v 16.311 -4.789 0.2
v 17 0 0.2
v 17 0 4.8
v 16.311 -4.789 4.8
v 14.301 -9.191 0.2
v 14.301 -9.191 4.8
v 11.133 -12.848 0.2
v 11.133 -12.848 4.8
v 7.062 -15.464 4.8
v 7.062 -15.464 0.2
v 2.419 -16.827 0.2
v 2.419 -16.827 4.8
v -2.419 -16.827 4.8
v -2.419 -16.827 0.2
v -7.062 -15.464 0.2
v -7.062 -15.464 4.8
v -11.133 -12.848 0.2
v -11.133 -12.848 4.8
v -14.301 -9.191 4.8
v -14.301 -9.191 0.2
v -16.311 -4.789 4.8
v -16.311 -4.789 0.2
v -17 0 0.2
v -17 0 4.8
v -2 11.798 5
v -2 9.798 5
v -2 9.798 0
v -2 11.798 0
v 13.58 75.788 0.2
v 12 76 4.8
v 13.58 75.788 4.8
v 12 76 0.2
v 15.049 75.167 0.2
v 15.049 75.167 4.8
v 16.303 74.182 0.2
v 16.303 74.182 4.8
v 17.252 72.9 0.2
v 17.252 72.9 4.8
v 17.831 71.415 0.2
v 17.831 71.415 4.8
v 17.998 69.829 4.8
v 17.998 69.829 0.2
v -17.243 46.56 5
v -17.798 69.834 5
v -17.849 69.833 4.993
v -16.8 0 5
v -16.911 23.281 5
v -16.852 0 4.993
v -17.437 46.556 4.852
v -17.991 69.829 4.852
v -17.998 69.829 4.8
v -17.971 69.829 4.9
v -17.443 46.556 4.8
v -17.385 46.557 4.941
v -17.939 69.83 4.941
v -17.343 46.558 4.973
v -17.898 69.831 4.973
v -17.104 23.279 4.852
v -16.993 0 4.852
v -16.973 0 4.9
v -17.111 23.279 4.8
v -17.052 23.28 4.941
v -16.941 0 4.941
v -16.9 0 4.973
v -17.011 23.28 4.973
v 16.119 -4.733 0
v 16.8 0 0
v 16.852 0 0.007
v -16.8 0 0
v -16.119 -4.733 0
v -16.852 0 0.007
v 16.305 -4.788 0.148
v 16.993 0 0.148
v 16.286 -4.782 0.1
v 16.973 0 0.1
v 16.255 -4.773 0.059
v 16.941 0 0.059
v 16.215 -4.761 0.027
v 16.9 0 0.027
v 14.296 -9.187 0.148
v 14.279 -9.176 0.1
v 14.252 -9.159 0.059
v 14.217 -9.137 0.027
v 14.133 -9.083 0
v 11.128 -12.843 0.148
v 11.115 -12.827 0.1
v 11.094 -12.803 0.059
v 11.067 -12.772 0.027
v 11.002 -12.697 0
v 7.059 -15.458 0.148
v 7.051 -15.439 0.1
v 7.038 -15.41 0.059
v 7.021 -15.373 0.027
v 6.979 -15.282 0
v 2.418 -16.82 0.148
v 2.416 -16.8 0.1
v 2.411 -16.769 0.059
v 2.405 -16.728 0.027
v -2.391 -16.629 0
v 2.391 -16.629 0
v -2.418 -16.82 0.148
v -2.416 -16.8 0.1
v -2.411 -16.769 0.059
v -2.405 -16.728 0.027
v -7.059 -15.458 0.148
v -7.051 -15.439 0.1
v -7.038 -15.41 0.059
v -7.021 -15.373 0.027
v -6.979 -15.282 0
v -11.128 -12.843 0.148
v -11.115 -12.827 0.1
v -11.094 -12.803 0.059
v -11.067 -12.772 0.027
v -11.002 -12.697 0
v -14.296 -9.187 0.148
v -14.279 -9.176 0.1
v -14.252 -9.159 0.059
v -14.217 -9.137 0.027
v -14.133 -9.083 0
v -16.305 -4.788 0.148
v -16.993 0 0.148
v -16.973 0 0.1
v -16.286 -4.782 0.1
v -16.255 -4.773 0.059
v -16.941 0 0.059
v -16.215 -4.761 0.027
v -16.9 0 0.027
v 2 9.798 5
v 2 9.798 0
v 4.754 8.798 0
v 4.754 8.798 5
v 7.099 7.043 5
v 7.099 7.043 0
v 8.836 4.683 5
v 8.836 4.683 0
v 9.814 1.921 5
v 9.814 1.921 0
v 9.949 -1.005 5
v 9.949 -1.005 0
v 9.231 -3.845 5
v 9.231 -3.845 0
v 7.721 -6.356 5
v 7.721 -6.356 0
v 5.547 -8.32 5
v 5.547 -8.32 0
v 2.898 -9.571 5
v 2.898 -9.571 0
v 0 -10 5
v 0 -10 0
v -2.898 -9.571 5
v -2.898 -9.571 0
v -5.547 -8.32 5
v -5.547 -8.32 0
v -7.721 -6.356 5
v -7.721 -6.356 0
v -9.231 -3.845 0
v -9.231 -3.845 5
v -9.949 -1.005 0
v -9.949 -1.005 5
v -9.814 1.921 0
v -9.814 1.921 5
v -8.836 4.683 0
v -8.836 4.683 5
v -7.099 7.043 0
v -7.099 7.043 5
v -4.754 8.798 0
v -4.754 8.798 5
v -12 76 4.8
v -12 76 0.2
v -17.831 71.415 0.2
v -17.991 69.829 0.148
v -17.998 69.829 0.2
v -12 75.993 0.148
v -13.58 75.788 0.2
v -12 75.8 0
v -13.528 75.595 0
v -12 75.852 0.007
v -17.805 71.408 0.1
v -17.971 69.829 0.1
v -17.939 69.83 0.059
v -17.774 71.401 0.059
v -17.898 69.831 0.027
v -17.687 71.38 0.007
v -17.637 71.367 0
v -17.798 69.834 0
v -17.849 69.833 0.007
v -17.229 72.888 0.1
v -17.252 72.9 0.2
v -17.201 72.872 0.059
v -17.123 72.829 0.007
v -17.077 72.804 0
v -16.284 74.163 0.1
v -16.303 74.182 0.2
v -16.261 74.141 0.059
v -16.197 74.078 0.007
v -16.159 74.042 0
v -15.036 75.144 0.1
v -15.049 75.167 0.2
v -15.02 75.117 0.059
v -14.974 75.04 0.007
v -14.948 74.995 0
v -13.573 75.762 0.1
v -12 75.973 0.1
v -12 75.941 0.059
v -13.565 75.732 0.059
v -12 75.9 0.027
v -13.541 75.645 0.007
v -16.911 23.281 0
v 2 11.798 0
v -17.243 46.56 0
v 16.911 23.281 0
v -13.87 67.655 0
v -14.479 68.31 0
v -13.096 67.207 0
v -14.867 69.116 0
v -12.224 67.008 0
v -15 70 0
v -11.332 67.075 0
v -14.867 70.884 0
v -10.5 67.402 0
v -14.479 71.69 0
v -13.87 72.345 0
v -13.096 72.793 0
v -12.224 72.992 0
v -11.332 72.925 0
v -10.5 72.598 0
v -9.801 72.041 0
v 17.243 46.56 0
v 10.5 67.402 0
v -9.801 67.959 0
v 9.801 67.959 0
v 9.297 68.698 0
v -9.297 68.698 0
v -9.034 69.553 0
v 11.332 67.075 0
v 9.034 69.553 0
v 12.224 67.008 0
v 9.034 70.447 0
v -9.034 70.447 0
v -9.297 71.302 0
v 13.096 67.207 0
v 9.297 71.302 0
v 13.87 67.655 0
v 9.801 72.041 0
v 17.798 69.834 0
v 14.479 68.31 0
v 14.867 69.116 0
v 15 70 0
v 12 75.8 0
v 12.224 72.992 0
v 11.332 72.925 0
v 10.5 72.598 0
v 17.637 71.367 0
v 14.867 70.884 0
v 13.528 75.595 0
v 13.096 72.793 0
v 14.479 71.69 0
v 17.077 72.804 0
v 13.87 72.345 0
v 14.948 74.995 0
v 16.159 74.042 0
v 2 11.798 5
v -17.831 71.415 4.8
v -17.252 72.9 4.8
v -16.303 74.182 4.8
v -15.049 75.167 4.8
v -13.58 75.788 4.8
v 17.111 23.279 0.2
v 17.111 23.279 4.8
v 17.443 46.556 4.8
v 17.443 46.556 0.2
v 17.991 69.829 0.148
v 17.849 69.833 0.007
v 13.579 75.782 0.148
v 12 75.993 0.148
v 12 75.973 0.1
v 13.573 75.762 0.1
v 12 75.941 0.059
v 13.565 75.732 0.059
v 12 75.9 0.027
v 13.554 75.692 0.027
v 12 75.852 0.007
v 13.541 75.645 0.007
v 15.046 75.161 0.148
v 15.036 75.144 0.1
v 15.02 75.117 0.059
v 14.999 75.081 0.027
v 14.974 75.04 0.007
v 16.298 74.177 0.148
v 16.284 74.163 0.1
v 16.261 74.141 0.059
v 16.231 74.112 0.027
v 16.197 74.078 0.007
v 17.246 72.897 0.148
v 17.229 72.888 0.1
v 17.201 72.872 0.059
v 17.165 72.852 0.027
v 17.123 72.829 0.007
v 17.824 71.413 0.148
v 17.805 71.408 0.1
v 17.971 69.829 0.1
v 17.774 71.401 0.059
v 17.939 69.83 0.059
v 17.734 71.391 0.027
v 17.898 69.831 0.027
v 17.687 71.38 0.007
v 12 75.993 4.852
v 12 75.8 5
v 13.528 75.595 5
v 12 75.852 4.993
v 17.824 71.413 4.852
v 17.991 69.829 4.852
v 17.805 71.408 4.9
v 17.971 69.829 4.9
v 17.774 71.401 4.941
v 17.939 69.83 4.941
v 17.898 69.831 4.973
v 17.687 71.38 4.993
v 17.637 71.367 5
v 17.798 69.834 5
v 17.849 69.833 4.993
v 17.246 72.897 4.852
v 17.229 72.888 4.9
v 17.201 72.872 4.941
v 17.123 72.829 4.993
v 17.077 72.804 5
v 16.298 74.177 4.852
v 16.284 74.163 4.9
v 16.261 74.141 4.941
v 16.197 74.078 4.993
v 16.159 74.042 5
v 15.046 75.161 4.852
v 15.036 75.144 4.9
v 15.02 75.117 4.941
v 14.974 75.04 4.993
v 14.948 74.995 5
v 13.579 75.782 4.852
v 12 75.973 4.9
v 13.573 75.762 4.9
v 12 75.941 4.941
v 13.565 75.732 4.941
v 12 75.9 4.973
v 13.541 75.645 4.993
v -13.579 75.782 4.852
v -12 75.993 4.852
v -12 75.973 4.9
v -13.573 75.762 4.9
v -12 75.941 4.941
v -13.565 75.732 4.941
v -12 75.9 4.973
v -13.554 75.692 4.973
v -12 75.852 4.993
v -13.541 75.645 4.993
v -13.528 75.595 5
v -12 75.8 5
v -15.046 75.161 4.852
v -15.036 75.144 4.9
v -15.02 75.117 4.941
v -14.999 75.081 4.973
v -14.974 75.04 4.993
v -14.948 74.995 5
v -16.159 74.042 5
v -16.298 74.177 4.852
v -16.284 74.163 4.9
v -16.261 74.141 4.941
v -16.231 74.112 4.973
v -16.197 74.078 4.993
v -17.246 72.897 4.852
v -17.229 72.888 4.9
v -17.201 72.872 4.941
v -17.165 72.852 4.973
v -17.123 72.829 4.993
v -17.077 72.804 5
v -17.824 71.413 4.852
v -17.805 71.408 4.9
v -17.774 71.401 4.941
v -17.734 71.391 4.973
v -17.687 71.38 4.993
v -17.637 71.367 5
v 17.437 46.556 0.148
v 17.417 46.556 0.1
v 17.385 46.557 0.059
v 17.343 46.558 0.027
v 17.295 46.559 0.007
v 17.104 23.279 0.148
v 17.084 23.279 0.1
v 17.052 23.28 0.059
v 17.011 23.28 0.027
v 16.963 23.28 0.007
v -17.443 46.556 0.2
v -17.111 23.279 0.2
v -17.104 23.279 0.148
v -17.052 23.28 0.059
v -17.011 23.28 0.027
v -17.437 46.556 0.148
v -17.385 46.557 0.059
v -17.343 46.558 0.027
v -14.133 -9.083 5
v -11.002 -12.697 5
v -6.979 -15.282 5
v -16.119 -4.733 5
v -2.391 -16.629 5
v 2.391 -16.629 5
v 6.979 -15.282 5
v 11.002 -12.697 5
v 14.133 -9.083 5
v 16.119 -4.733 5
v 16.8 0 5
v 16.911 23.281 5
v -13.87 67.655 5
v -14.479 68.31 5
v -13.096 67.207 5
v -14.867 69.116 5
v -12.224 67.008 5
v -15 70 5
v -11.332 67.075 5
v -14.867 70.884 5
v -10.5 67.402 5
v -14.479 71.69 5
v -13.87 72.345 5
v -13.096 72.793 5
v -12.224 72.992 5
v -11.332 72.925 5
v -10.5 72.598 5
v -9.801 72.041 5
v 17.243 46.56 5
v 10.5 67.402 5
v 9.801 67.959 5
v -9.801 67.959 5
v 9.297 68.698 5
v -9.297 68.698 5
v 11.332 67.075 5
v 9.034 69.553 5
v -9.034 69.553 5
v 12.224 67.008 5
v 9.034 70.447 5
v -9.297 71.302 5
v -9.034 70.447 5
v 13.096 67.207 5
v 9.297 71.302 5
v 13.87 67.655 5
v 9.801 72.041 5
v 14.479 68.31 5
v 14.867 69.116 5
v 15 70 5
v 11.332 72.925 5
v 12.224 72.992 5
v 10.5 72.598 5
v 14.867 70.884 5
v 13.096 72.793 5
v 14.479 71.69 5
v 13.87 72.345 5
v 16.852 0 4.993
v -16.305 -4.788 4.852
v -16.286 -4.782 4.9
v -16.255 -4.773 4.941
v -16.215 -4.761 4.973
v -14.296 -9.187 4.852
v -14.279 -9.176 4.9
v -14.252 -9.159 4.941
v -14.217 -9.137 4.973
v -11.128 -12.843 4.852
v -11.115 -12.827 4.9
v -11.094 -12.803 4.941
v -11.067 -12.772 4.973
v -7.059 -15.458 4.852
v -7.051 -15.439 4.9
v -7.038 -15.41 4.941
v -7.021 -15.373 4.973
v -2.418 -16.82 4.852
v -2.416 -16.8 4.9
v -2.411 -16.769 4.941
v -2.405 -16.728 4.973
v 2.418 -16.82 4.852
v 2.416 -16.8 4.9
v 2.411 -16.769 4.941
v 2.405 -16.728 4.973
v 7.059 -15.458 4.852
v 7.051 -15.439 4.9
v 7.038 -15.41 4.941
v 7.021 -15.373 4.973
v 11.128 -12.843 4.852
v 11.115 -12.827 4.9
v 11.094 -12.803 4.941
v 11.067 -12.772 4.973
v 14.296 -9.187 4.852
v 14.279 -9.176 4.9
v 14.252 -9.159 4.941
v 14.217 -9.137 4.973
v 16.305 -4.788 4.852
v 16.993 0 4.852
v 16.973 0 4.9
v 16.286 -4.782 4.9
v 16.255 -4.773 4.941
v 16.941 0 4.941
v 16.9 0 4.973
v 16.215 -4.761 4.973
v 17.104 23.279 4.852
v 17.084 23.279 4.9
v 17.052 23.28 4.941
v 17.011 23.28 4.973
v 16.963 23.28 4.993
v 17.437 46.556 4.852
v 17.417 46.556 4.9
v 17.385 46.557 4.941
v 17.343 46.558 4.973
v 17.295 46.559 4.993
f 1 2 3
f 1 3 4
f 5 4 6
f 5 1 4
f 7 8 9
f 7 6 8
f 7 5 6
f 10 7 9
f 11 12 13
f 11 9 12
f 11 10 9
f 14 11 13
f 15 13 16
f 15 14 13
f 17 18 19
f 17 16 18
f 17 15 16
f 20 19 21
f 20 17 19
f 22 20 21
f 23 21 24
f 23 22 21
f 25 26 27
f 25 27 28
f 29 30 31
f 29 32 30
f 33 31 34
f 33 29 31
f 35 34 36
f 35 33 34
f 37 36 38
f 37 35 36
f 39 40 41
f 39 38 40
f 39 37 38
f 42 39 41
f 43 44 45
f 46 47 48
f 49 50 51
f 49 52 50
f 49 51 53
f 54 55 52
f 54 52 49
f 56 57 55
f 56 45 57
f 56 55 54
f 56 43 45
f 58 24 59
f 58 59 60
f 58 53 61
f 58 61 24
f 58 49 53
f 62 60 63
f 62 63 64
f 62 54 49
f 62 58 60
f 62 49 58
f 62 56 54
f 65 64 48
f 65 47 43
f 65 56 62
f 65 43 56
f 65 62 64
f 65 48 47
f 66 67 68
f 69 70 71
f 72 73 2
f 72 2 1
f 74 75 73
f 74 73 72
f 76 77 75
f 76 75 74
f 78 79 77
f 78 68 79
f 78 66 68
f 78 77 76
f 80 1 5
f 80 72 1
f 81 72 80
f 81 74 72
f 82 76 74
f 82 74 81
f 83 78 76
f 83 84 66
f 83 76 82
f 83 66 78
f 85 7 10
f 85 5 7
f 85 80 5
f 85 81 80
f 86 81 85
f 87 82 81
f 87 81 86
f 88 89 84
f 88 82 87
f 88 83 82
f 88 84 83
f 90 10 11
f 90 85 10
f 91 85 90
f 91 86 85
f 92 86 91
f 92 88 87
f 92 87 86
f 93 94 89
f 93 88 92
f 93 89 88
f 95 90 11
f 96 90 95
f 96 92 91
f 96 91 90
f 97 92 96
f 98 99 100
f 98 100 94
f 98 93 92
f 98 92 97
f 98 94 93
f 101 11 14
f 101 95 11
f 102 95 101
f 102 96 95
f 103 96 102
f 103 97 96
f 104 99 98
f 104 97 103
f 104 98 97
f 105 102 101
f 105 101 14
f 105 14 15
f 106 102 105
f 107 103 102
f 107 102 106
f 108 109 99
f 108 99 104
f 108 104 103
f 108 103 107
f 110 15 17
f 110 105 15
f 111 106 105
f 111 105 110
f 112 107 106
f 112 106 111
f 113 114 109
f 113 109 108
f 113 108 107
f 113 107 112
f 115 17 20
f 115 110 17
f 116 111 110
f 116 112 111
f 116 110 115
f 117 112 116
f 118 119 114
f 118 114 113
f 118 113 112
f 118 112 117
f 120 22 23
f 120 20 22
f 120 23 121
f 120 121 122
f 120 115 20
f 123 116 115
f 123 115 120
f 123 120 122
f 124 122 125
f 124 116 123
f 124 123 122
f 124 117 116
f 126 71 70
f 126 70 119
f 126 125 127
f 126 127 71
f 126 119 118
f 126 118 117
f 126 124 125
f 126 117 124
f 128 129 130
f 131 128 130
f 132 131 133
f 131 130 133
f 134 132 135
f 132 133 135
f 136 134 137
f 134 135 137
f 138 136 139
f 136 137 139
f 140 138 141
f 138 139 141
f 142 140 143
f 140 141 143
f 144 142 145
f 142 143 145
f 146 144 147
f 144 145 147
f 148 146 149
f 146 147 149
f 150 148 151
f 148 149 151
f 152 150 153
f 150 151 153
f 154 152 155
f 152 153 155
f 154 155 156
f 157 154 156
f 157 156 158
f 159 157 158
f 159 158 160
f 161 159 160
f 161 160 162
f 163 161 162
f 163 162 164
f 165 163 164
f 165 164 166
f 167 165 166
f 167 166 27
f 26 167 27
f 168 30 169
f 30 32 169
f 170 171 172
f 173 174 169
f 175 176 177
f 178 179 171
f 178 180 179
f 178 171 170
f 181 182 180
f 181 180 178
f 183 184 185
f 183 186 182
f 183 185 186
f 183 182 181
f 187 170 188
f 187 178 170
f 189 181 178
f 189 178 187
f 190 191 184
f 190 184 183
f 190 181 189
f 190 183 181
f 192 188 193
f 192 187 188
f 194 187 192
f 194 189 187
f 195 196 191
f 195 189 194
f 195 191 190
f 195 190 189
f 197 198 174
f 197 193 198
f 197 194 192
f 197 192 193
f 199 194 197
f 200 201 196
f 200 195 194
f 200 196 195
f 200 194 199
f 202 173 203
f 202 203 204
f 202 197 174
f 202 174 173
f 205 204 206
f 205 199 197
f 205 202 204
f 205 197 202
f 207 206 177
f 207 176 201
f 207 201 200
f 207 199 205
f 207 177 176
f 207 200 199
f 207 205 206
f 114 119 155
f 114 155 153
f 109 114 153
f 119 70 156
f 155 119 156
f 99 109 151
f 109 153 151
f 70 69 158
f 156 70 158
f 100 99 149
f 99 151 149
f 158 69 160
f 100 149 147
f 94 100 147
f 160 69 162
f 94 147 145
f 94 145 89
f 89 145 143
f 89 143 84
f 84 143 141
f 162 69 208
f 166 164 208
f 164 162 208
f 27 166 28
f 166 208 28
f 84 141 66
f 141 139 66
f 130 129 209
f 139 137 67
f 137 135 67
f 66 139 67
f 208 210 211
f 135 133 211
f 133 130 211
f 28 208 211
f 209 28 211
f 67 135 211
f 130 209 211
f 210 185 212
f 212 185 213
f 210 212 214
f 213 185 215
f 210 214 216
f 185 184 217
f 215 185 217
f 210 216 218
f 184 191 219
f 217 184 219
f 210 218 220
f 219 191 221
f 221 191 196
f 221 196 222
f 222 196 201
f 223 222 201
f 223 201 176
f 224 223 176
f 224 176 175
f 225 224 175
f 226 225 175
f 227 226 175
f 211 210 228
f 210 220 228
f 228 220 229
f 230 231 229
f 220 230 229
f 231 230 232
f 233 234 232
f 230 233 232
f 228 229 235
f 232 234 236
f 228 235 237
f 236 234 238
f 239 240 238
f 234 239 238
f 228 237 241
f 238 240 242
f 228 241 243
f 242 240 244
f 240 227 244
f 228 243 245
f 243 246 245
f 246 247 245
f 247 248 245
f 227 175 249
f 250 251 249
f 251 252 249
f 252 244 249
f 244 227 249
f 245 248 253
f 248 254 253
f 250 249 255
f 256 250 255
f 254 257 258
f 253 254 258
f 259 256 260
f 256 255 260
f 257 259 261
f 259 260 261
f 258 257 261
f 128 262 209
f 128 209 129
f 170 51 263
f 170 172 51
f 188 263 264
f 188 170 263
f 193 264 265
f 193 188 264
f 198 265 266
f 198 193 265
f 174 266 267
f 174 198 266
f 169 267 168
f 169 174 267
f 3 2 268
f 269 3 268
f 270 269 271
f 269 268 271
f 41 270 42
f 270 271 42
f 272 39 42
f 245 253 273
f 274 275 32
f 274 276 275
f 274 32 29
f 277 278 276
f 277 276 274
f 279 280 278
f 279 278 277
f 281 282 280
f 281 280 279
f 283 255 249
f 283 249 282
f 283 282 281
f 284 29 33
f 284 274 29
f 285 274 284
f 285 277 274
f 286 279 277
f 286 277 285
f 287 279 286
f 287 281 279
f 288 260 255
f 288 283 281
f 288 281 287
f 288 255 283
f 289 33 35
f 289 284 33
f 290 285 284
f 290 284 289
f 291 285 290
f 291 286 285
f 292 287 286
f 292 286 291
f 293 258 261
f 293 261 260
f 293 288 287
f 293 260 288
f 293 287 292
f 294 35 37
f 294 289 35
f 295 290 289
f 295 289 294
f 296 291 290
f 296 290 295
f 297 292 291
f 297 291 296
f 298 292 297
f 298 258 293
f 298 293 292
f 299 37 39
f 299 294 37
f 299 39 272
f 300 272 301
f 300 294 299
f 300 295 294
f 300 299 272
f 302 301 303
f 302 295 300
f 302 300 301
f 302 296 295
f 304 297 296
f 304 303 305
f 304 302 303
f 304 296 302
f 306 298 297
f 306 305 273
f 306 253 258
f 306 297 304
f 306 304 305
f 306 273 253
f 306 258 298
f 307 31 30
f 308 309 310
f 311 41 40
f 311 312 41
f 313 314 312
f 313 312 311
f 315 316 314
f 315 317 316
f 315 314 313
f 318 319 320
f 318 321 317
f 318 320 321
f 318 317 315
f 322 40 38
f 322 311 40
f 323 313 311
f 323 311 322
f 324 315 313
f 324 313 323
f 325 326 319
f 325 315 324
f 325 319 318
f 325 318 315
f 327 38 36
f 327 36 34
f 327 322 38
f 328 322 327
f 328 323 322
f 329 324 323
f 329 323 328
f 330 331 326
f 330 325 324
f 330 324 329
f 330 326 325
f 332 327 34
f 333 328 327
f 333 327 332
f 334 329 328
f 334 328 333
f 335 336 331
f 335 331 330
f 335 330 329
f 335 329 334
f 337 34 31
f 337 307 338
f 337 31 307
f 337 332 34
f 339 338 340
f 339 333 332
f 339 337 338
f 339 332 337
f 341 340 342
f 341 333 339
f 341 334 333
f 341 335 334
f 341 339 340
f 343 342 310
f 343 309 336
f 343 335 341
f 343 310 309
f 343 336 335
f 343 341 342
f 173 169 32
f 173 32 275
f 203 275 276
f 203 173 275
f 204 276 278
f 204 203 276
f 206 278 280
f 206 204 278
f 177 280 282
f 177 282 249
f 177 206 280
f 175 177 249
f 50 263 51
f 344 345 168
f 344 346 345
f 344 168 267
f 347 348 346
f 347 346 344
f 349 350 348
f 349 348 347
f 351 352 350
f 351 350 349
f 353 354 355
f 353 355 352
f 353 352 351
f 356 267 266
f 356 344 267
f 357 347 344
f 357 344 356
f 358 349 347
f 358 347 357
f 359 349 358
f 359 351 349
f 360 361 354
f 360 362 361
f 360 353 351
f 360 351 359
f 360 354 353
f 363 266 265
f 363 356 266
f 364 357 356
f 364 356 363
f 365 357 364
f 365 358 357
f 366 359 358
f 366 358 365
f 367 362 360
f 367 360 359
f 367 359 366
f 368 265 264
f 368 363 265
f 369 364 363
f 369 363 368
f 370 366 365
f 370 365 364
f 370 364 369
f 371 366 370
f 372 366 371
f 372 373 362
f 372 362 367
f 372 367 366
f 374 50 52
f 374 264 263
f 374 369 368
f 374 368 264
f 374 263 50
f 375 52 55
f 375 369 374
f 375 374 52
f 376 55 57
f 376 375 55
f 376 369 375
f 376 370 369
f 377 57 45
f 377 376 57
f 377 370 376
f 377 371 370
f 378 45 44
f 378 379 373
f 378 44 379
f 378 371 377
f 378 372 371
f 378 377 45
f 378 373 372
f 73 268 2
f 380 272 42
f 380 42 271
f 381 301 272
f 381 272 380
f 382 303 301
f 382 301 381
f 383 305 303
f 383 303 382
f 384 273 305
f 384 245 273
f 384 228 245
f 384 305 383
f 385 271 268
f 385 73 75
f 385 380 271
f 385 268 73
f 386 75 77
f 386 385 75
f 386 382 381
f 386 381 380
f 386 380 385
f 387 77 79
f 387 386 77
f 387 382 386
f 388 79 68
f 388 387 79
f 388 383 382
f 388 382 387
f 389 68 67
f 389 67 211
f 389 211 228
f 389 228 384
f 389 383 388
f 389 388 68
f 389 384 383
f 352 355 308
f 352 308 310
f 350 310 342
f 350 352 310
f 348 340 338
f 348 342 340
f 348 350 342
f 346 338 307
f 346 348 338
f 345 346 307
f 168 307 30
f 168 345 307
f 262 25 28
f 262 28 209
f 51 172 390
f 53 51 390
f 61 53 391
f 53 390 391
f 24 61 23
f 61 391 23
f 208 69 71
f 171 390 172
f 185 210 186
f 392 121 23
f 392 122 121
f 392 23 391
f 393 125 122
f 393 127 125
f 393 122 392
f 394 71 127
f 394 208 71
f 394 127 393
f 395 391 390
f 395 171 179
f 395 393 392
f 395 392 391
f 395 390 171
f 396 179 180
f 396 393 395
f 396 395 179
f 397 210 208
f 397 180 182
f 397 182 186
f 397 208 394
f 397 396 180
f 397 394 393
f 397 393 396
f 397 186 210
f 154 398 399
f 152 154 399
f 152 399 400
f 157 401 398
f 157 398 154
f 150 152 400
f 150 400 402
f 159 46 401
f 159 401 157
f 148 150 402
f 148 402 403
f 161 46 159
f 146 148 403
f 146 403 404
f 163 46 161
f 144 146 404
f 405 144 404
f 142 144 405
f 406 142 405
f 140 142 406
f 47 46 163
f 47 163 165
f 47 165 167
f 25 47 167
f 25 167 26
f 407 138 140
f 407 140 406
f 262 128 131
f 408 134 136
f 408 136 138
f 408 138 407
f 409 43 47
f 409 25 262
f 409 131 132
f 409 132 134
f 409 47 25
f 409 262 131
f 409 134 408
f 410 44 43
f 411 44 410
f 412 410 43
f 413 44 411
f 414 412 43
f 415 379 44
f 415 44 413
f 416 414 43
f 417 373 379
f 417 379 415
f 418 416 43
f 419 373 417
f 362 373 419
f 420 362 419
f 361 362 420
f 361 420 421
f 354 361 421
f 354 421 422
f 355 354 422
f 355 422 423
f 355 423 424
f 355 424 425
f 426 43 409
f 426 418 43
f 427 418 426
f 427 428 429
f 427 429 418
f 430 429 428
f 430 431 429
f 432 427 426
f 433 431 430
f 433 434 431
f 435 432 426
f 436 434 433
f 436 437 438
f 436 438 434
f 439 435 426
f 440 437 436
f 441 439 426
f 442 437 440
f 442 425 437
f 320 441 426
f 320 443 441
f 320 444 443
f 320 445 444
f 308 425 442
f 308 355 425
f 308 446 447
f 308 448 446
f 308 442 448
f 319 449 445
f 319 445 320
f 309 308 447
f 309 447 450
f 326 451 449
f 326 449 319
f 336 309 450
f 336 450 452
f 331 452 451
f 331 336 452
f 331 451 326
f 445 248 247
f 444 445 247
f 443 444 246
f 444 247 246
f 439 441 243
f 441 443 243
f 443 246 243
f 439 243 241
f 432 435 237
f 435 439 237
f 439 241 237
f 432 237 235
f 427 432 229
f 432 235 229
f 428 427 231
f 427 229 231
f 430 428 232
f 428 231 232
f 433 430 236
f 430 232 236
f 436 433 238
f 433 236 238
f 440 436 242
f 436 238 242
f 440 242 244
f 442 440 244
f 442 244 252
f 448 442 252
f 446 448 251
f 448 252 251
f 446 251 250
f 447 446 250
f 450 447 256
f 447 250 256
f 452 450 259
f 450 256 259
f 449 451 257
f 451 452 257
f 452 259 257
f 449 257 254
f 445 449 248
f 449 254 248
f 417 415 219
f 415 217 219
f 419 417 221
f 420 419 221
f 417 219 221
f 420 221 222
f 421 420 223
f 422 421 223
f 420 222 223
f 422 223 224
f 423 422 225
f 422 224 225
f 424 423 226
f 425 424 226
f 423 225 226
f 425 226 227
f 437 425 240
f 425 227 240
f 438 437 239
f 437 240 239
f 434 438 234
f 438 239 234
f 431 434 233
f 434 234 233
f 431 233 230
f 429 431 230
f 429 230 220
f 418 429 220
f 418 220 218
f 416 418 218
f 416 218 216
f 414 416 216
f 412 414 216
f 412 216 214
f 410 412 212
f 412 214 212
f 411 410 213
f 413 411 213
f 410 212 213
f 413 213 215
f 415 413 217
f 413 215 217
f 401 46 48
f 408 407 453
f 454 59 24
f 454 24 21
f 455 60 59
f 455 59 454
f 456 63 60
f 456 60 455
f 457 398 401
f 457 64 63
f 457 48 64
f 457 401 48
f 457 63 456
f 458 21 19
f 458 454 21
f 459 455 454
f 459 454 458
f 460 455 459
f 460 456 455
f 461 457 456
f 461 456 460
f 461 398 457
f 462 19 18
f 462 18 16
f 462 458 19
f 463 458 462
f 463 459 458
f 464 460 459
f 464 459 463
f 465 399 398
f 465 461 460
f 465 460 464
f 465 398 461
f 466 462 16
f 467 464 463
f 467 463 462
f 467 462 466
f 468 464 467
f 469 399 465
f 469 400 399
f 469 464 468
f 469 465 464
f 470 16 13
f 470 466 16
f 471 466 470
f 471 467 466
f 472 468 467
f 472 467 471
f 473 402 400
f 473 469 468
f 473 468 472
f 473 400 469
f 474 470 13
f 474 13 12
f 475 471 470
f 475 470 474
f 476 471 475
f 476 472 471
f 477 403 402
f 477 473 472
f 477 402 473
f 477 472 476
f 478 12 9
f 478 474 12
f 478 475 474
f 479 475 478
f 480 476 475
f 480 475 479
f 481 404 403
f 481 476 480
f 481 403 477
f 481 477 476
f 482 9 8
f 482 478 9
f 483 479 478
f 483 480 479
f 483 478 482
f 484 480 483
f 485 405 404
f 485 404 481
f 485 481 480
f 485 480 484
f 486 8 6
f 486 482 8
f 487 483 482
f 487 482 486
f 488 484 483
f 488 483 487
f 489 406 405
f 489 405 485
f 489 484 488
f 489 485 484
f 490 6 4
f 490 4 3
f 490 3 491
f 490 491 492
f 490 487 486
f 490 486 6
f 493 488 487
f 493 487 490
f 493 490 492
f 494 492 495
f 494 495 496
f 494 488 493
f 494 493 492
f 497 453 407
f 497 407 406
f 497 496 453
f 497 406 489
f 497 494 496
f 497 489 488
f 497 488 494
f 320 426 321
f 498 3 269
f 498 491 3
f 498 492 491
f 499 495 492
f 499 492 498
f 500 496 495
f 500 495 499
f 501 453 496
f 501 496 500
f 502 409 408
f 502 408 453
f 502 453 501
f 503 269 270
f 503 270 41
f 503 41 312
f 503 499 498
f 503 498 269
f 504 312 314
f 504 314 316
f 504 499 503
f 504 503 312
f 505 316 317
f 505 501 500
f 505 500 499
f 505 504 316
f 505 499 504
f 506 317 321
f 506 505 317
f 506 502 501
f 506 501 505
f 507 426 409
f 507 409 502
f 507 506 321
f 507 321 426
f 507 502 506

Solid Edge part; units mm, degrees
sketch "Sketch1" plane through (0, 0, 0) normal (0, 0, 1) x (1, 0, 0)
  circle A0 centre (12, 70) radius 3
  arc A1 (0, -17) -> (17, 0) centre (0, 0) ccw
  arc A2 (17, 0) -> (17.9976, 69.8286) centre (2461.5, 0) cw
  arc A3 (12, 76) -> (17.9976, 69.8286) centre (12, 70) cw
  line L0 (12, 76) -> (0, 76)
  line L1 (0, 10) -> (0, 76)
  arc A4 (0, 10) -> (0, -10) centre (0, 0) cw
  line L2 (0, -17) -> (0, -10)
  dimension "D1" = 17
  dimension "D2" = 10
  dimension "D3" = 12
  dimension "D4" = 70
  dimension "D5" = 6
extrude "Protrusion1" add sketch "Sketch1" along normal blind 5
mirror "Mirror1" about plane through (0, 0, 0) normal (1, 0, 0) of "Protrusion1"
sketch "Sketch2" plane through (0, 14.5, 5) normal (0, 0, 1) x (1, 0, 0)
  arc A0 (-2, -4.702) -> (2, -4.702) centre (0, -14.5) cw
  line L0 (2, -2.702) -> (2, -4.702)
  line L1 (-2, -2.702) -> (2, -2.702)
  line L2 (-2, -4.702) -> (-2, -2.702)
  dimension "D1" = 4
  dimension "D2" = 2
extrude "ExtrudedCutout_1" cut sketch "Sketch2" against normal blind 9.3641
fillet "Round_1" radius 0.2 12 edges at (17.2494, 34.9179, 0) (16.3028, 74.1816, 0) (0, 76, 0) (-16.3028, 74.1816, 0) (-17.2494, 34.9179, 0) (0, -17, 0) (17.2494, 34.9179, 5) (16.3028, 74.1816, 5) (0, 76, 5) (-16.3028, 74.1816, 5) (-17.2494, 34.9179, 5) (0, -17, 5)
properties material "Steel"
